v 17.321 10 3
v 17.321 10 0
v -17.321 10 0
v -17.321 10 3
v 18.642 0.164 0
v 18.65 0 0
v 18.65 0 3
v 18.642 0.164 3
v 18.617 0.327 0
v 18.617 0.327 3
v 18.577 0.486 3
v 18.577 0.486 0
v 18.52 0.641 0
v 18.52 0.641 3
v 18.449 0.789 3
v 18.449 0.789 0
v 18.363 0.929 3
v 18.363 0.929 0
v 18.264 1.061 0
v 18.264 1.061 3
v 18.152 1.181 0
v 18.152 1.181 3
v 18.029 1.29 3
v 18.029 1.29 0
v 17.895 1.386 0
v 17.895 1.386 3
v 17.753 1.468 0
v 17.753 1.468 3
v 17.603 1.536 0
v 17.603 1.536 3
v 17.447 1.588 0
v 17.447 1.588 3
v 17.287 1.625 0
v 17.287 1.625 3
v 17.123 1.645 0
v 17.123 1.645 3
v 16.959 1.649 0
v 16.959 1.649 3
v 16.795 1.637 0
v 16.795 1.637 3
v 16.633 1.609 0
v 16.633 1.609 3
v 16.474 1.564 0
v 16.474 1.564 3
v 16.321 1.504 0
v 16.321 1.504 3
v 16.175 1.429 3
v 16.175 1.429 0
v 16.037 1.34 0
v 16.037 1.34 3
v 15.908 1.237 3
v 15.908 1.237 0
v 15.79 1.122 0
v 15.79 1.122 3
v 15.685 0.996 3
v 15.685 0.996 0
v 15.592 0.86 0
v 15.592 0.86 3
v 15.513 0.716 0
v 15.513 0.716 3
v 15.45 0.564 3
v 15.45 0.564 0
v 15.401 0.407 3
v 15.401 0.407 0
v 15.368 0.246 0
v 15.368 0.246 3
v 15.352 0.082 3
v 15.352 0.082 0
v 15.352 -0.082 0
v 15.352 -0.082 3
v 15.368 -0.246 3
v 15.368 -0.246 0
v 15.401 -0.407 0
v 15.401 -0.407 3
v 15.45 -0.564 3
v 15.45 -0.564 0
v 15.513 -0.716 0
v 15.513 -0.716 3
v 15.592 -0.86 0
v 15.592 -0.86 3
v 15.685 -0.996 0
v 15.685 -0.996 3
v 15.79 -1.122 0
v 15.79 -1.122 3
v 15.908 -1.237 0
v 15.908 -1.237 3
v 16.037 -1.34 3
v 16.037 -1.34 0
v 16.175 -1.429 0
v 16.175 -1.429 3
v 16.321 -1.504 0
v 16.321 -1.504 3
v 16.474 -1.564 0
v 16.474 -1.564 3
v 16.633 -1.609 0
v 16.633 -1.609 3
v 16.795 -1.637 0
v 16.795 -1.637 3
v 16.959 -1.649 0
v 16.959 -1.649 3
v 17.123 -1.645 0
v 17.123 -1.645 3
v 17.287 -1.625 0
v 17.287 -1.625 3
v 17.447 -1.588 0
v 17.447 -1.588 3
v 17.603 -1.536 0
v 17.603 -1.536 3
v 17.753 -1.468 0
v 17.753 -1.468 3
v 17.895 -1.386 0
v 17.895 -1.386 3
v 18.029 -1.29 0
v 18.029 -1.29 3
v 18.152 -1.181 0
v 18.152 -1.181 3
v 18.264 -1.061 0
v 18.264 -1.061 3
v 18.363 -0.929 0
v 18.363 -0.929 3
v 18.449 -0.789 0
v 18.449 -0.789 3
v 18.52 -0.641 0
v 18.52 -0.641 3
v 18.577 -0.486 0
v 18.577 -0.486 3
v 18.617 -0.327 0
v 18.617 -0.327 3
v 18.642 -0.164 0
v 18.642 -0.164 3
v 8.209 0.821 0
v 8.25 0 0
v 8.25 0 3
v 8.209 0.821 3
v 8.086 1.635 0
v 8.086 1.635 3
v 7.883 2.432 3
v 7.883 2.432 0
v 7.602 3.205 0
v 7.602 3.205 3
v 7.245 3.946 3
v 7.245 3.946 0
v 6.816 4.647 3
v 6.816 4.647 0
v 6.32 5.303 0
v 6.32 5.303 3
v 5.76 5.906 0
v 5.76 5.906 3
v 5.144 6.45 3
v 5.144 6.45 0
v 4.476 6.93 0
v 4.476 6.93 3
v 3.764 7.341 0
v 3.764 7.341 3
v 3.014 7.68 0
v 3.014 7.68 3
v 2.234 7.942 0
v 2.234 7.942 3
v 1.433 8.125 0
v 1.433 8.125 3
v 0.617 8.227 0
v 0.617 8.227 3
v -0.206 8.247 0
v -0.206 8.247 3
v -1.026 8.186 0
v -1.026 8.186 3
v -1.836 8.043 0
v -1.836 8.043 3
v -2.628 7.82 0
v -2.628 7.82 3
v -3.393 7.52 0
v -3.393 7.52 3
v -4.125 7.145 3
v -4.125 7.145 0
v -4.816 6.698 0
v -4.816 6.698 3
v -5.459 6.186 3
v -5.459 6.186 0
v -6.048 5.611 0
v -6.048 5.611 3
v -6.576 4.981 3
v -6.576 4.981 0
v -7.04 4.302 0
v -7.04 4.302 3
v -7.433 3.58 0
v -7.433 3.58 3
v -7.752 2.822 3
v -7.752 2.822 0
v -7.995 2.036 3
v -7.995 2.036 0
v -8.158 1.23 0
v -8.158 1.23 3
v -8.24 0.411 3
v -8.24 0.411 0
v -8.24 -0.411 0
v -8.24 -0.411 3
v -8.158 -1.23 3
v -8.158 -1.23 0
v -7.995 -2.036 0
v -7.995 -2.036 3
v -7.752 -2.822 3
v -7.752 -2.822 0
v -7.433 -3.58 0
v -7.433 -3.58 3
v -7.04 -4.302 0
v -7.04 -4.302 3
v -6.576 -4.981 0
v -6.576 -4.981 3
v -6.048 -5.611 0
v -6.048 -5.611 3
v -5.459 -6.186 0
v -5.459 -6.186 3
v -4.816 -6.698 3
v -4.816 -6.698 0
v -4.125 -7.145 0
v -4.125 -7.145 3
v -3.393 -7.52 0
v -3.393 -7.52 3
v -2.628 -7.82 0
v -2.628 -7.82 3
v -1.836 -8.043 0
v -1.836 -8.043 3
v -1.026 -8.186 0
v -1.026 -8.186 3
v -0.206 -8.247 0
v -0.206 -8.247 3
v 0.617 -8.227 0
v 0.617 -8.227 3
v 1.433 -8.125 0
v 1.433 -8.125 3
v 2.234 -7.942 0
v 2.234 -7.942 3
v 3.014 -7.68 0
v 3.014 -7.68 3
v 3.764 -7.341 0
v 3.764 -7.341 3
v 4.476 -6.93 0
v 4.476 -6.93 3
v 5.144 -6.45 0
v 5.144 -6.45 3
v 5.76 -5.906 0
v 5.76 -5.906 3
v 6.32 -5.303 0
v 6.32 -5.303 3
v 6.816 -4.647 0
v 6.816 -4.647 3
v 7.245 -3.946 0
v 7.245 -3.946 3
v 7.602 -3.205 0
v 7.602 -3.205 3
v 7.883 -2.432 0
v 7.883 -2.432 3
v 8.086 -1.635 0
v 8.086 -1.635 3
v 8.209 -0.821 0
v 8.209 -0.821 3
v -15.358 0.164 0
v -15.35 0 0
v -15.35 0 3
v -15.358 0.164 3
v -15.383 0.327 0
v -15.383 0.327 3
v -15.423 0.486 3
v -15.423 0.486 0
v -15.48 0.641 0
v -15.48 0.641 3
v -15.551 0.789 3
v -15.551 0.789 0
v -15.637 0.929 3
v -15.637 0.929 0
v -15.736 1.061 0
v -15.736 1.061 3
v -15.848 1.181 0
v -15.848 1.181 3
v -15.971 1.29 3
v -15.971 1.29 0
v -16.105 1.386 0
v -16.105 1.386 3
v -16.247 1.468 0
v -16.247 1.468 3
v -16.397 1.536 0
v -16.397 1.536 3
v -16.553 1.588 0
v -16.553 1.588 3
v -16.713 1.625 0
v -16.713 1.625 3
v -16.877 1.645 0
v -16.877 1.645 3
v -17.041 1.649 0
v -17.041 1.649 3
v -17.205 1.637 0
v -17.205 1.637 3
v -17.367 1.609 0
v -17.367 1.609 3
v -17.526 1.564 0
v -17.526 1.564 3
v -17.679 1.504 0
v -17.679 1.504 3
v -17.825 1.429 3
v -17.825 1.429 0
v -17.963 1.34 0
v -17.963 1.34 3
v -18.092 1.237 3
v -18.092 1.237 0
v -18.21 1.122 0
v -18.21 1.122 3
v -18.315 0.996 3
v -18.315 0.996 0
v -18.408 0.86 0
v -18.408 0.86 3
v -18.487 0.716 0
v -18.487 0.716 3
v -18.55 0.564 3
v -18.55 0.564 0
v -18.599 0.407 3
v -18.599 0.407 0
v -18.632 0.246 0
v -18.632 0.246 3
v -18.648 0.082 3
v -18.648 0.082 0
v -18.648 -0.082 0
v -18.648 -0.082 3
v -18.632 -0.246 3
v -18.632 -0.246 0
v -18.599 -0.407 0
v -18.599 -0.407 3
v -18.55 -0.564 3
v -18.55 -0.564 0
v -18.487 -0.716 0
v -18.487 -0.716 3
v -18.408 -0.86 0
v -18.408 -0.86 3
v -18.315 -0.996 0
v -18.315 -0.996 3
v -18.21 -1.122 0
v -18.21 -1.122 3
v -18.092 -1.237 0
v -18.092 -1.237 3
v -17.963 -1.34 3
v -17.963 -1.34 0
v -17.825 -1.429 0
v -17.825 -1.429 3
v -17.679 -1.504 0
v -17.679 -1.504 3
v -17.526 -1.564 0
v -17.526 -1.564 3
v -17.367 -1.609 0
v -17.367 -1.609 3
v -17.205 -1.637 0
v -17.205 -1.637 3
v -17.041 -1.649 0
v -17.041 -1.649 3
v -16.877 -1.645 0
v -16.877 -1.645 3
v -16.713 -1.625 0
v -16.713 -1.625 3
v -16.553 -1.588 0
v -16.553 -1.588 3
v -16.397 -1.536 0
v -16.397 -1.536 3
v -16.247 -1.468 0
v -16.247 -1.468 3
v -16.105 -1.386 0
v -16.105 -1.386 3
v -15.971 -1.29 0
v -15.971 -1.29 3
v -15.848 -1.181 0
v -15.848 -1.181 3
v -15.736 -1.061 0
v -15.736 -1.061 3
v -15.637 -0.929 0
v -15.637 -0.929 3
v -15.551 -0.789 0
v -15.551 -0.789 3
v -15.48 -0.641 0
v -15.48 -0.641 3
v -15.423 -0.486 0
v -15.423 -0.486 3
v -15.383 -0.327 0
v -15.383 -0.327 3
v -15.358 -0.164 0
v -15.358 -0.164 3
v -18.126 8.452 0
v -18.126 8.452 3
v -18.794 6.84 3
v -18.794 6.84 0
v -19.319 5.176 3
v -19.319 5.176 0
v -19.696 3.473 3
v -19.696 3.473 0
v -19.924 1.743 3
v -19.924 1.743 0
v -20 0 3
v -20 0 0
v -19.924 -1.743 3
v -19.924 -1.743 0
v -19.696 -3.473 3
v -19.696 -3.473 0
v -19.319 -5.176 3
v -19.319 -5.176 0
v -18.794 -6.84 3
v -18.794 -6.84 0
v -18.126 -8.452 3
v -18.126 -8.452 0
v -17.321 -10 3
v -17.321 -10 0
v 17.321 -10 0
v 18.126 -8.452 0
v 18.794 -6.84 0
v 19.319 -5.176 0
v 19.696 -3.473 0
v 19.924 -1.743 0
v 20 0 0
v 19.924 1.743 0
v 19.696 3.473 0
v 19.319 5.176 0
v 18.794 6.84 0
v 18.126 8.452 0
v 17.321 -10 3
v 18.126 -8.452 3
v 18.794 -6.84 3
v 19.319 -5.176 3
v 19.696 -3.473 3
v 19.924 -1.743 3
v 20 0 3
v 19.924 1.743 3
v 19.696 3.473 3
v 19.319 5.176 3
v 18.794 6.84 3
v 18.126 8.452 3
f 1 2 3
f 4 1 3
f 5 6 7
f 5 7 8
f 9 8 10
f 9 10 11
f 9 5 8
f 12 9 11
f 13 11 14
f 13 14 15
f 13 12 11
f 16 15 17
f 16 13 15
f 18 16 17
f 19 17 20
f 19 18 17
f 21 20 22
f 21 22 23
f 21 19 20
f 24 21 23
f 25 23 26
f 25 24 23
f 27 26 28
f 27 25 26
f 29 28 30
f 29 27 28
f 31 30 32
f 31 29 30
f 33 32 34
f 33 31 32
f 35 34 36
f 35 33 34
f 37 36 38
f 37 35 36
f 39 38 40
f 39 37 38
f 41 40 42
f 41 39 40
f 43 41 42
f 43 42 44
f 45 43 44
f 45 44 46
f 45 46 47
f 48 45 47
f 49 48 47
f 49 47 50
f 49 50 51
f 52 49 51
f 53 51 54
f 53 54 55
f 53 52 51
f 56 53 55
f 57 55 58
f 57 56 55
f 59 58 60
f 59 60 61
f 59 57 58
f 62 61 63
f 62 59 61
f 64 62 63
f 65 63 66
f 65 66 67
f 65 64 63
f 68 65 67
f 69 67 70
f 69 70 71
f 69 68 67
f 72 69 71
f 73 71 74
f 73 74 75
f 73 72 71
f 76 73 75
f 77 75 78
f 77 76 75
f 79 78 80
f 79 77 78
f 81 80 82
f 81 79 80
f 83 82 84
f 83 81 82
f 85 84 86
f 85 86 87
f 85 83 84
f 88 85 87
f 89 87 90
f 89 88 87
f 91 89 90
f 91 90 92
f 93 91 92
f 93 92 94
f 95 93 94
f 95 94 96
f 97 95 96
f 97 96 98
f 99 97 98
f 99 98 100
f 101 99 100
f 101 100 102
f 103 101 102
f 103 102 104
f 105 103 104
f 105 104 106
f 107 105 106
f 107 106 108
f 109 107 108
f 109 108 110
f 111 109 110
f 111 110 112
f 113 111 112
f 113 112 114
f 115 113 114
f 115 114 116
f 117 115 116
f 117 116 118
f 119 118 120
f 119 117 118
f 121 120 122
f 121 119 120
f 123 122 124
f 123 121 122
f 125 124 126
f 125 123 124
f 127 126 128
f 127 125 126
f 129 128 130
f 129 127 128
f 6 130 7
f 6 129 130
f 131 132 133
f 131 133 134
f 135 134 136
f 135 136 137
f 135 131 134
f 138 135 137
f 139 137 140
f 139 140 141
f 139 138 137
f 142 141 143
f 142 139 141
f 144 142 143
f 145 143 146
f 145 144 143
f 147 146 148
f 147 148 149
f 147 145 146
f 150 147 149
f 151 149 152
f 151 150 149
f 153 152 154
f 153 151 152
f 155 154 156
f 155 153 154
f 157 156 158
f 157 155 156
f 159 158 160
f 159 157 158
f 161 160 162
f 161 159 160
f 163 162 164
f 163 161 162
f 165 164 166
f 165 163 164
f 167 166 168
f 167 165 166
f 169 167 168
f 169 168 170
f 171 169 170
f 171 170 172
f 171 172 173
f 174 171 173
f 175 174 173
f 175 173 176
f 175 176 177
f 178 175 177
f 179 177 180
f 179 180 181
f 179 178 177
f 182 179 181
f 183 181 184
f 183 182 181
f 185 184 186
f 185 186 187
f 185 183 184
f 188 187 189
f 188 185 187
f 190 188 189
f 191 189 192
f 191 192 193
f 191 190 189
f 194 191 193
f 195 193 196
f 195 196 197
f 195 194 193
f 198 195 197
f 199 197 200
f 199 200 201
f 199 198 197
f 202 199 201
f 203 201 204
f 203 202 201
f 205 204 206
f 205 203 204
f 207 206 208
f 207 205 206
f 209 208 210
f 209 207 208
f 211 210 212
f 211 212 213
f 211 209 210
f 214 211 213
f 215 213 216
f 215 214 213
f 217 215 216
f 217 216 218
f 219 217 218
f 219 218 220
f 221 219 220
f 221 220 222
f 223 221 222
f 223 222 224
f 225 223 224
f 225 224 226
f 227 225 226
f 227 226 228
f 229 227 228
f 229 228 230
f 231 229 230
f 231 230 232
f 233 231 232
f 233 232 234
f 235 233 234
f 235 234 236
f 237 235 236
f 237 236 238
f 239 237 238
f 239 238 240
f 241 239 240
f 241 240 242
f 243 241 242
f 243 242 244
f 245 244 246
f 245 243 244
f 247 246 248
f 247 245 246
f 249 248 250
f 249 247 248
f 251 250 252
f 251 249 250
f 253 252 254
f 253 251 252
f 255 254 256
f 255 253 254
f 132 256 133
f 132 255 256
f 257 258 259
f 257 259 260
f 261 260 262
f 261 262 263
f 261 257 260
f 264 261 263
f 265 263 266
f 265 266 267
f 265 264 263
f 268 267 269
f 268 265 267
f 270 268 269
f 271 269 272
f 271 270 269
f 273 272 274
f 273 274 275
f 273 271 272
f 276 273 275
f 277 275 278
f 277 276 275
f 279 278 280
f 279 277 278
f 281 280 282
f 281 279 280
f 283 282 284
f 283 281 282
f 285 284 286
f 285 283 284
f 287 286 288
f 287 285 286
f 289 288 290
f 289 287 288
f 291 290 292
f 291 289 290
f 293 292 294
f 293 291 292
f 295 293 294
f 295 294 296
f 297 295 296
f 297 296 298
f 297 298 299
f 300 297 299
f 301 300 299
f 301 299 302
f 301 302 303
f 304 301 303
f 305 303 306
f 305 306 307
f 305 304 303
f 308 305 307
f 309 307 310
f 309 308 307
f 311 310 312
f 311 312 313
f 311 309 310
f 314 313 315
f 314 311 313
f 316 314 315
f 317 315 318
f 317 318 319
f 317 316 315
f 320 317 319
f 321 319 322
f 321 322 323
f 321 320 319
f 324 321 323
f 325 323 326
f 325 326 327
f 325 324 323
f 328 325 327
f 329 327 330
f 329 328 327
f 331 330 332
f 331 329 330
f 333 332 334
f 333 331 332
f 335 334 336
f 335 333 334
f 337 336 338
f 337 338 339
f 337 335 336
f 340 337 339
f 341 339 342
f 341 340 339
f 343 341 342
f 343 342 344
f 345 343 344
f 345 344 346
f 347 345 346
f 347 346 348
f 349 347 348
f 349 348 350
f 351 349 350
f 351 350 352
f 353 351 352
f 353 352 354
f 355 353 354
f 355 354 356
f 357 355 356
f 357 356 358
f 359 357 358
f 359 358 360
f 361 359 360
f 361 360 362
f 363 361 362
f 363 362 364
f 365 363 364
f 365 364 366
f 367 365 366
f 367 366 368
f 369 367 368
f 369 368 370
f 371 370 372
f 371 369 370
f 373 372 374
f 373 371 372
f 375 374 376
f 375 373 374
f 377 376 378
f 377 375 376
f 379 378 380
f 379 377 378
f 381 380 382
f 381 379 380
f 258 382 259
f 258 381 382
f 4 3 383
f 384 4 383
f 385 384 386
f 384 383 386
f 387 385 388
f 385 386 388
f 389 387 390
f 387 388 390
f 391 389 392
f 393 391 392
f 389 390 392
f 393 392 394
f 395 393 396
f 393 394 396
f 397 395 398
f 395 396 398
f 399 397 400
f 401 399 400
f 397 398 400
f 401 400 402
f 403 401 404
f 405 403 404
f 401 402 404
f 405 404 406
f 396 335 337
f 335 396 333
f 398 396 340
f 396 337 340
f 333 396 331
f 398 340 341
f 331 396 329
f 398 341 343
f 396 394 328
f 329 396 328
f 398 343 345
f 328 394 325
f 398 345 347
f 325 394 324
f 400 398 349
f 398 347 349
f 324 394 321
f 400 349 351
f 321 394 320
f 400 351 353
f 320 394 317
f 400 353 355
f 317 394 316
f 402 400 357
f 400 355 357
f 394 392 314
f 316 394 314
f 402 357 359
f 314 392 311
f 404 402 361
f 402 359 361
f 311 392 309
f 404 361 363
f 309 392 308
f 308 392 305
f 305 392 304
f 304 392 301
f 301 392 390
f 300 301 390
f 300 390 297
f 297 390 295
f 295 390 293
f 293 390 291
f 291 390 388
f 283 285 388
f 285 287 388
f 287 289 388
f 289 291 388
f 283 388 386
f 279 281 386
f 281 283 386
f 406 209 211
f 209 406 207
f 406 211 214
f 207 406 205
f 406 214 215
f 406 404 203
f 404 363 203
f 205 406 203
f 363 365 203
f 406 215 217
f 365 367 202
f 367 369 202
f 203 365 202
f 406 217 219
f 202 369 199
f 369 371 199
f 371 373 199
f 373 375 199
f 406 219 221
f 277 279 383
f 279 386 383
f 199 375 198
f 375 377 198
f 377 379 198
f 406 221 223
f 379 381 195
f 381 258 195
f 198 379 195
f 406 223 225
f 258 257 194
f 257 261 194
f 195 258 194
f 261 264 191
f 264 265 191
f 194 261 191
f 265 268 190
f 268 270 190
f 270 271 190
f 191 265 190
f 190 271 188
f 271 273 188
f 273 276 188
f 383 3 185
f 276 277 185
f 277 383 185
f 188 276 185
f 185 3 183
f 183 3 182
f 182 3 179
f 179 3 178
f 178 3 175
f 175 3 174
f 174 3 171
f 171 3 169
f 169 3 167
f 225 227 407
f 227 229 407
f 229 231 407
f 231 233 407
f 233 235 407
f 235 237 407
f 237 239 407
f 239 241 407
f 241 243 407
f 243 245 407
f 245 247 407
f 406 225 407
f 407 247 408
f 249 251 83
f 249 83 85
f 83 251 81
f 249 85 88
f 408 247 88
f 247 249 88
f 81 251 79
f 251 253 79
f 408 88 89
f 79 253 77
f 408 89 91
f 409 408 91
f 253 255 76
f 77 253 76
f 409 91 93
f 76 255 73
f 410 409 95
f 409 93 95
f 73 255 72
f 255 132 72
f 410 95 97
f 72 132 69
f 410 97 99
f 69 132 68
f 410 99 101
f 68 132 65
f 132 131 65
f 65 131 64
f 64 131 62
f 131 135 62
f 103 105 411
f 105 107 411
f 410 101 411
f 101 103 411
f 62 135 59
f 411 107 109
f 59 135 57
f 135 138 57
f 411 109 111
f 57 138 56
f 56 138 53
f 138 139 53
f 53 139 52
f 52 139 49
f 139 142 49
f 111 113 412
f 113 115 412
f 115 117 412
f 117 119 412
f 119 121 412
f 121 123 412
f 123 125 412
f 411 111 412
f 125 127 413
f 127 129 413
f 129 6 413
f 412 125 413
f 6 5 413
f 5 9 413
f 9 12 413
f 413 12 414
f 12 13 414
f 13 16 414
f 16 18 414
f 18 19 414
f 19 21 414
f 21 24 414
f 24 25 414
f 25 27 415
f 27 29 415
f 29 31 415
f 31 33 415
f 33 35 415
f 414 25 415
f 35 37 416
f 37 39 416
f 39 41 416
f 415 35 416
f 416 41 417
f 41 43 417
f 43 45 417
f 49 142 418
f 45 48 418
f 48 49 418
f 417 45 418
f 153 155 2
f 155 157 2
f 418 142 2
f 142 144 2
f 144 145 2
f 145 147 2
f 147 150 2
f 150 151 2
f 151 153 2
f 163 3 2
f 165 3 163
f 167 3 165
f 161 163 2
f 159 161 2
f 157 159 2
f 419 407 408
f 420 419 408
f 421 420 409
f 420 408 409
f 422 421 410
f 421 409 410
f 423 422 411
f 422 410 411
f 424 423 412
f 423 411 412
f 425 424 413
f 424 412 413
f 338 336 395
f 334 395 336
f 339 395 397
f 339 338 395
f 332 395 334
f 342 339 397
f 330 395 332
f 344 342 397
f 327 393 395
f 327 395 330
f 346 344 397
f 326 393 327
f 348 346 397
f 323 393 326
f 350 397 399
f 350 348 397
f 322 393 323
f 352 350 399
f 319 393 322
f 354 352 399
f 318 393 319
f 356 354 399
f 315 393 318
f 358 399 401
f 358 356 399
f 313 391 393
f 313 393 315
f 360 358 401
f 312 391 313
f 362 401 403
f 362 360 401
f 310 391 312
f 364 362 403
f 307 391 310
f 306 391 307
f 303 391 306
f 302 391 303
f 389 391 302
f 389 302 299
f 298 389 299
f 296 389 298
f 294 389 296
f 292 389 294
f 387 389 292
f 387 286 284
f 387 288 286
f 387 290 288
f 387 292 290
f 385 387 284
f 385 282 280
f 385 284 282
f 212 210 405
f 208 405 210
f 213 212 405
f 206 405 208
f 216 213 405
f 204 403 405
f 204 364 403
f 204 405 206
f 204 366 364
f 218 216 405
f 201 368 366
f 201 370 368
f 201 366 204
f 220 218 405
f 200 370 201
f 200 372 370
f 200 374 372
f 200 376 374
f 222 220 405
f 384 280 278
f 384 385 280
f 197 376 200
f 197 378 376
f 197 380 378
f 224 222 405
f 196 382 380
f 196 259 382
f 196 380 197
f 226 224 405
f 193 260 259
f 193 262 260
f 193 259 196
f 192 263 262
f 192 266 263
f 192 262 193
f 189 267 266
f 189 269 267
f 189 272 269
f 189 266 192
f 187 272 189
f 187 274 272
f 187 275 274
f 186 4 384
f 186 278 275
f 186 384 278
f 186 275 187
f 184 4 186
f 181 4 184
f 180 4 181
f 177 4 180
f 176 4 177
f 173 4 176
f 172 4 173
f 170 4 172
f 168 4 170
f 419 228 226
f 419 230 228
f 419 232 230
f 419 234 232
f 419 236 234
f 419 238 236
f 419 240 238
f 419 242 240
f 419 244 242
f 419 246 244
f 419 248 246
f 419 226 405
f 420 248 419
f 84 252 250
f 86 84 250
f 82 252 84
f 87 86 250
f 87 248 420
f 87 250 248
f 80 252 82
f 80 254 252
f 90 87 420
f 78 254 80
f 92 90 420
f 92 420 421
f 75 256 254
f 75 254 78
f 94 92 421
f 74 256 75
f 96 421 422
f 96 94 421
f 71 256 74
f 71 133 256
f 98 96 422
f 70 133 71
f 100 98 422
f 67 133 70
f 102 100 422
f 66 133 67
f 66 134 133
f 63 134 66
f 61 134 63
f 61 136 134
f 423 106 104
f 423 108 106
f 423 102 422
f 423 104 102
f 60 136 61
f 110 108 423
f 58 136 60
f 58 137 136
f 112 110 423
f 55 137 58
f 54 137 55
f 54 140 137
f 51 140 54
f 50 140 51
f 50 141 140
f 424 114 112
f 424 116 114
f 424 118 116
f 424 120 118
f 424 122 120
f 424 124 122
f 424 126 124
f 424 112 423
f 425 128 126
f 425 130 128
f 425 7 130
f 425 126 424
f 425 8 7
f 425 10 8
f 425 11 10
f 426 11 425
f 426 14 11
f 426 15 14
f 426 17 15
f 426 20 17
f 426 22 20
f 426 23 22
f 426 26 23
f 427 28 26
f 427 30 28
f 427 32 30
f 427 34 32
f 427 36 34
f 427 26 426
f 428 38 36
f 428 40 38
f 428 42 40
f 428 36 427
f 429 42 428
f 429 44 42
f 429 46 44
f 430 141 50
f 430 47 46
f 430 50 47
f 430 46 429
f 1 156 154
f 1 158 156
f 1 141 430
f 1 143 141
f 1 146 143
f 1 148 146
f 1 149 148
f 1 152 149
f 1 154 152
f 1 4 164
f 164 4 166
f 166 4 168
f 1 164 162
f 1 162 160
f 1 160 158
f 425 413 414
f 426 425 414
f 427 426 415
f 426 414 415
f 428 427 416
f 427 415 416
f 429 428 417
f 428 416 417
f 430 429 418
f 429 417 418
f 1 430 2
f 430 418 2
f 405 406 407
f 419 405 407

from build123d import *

# Parameters (mm, degrees)
SKETCH_1_R      = 1.65
SKETCH_1_R_2    = 8.25
EXTRUDE_1_DEPTH = 3


with BuildPart() as part:
    # 草图1 → 凸台-拉伸1 (new body)
    with BuildSketch(Plane.XY):
        with BuildLine():
            ThreePointArc((-17.320508076, 10), (-20, 0), (-17.320508076, -10))
            Line((-17.320508076, -10), (17.320508076, -10))
            ThreePointArc((17.320508076, -10), (19.318516526, -5.176380902), (20, 0))
            ThreePointArc((20, 0), (19.318516526, 5.176380902), (17.320508076, 10))
            Line((17.320508076, 10), (-17.320508076, 10))
        make_face()
        with Locations((-17, 0)):
            Circle(SKETCH_1_R, mode=Mode.SUBTRACT)
        Circle(SKETCH_1_R_2, mode=Mode.SUBTRACT)
        with Locations((17, 0)):
            Circle(SKETCH_1_R, mode=Mode.SUBTRACT)
    extrude(amount=EXTRUDE_1_DEPTH)


solid = part.part
